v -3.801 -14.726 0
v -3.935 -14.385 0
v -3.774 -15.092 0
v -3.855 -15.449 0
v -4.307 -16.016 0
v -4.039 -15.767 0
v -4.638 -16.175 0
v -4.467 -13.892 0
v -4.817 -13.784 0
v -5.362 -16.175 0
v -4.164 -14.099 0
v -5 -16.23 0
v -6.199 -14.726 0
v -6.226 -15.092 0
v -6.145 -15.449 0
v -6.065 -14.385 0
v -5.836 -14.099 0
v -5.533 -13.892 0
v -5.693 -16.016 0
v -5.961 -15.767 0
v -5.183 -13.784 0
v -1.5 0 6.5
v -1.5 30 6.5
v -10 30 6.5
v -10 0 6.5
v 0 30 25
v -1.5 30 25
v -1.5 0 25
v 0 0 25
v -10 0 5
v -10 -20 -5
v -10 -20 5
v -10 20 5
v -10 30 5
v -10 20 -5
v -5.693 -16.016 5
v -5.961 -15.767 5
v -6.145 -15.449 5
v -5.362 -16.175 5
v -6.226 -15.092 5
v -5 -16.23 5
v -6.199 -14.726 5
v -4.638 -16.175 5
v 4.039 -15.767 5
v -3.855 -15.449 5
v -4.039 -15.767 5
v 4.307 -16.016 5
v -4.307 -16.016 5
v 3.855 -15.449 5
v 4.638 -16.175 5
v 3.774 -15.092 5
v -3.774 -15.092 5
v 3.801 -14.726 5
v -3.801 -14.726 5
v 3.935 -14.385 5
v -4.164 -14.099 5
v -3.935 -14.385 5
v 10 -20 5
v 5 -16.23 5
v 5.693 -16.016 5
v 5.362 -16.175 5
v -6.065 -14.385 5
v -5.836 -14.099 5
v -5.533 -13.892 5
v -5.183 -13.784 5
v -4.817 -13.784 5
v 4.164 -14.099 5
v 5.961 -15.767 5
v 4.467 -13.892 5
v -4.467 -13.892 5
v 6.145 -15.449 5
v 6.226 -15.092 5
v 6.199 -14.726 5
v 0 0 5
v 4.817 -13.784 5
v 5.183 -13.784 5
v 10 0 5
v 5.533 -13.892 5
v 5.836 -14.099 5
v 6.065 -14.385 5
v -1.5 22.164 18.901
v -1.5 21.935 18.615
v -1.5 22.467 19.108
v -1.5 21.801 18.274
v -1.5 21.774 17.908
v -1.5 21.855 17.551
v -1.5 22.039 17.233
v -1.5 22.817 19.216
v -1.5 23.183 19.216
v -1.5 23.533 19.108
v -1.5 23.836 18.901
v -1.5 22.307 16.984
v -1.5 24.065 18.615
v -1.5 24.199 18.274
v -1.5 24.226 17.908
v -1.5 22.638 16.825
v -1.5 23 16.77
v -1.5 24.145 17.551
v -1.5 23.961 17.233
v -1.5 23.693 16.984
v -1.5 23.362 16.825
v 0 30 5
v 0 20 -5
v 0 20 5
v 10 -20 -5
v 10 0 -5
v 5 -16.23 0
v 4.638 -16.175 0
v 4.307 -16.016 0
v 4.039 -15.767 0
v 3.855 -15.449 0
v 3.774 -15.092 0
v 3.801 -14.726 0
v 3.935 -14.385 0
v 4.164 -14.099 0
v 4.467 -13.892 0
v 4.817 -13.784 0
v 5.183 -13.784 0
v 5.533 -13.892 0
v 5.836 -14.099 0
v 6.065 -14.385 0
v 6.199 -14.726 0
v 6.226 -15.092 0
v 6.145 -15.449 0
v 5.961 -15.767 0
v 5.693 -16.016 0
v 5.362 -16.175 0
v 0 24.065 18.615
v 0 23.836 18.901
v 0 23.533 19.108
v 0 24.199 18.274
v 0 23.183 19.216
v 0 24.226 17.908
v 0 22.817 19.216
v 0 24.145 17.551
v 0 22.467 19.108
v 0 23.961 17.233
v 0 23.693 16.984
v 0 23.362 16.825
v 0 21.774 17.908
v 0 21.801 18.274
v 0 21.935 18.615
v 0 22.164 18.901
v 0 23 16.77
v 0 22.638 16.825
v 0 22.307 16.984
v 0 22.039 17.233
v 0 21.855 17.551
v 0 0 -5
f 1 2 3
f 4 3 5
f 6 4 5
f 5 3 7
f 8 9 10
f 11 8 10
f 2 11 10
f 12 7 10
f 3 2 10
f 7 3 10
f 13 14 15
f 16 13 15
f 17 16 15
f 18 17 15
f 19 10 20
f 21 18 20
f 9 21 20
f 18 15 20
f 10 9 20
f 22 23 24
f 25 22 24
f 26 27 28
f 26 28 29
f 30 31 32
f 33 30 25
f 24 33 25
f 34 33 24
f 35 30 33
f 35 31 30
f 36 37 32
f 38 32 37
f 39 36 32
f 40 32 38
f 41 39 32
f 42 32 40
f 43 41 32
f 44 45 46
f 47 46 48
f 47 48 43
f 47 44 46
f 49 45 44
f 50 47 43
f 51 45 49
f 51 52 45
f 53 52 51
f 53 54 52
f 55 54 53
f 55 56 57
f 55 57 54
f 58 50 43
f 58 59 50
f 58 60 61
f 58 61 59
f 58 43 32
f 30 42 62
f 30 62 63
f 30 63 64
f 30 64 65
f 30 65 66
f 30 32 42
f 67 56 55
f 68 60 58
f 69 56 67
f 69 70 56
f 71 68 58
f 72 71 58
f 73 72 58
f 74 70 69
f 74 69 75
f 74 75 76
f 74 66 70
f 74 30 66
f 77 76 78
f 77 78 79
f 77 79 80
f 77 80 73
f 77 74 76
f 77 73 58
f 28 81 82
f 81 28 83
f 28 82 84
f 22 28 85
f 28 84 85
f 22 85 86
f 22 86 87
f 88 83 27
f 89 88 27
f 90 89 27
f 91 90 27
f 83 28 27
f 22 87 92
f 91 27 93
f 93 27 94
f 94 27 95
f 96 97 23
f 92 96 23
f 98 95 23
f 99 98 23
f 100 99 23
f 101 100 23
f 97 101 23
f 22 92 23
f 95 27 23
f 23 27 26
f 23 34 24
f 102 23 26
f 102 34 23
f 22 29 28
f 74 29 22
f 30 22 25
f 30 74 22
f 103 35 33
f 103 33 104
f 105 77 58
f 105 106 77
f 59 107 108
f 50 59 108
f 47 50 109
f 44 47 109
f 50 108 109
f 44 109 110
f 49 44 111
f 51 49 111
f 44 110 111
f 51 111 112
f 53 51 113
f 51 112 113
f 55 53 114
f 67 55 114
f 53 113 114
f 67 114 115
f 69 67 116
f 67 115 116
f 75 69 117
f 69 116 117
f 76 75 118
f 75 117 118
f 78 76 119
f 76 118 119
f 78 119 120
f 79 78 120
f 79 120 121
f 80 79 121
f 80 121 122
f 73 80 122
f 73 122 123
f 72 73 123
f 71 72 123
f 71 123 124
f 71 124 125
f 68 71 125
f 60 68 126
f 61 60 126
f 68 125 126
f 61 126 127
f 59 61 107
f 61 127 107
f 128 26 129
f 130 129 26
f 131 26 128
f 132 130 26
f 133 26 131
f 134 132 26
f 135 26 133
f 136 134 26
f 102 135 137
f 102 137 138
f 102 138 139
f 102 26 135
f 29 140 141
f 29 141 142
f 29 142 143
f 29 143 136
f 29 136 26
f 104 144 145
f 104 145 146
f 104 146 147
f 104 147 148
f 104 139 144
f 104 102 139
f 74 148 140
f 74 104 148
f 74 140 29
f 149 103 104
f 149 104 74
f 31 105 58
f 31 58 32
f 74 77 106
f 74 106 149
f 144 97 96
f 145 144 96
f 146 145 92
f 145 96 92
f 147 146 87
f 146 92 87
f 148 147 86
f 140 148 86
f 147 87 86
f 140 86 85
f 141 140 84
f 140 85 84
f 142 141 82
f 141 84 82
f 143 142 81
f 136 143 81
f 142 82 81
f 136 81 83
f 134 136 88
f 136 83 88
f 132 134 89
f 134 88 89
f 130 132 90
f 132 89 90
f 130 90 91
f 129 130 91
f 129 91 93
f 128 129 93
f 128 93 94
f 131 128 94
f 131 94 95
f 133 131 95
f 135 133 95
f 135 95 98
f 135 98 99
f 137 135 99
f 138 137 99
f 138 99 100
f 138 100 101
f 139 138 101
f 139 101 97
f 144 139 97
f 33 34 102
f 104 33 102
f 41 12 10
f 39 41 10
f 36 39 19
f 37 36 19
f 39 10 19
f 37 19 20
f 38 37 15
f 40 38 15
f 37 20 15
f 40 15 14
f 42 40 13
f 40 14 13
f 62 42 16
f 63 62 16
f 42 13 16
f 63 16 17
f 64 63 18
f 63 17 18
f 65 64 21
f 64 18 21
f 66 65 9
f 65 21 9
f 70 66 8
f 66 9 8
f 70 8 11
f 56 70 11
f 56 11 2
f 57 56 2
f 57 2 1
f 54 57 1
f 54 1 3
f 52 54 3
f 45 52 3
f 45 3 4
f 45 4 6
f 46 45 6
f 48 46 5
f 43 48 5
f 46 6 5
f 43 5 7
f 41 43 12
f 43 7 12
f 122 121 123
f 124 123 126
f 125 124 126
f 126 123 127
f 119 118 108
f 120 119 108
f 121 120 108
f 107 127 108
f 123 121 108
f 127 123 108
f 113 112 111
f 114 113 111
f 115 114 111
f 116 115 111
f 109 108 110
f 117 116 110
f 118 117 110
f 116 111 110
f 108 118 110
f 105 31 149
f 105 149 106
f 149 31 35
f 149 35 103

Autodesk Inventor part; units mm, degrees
ref_plane "YZ Plane" through (0, 0, 0) normal (1, 0, 0) x (0, 1, 0)
ref_plane "XZ Plane" through (0, 0, 0) normal (0, 1, 0) x (-1, 0, 0)
ref_plane "XY Plane" through (0, 0, 0) normal (0, 0, 1) x (1, 0, 0)
sketch "Náčrt1" plane through (0, 0, 0) normal (0, 0, 1) x (1, 0, 0)
  line L0 (-14, 0) -> (14, 0) projected
  line L1 (0, 28) -> (0, -28) projected
  line L2 (-10, 20) -> (10, 20)
  line L3 (10, 20) -> (10, -20)
  line L4 (10, -20) -> (-10, -20)
  line L5 (-10, -20) -> (-10, 20)
  point P0 (0, 0)
  dimension "d0" = 20
  dimension "d1" = 40
extrude "Vysunutí1" add sketch "Náčrt1" along normal mid plane 10
sketch "Náčrt2" plane through (0, 0, 5) normal (0, 0, 1) x (1, 0, 0)
  line L0 (-10, -20) -> (10, -20) projected
  line L1 (10, -20) -> (10, 20) projected
  line L2 (10, 20) -> (-10, 20) projected
  line L3 (-10, 20) -> (-10, -20) projected
  line L4 (10, -20) -> (10, 20) projected
  line L5 (0, 20) -> (10, 20)
  line L6 (10, 20) -> (10, 0)
  line L7 (10, 0) -> (0, 0)
  line L8 (0, 0) -> (0, 20)
  point P0 (0, 0)
extrude "Vysunutí2" cut sketch "Náčrt2" against normal through all contours L7 L8 L2 L1
sketch "Náčrt3" plane through (0, 0, 5) normal (0, 0, 1) x (1, 0, 0)
  line L0 (10, -20) -> (10, 0) projected
  line L1 (-10, -20) -> (10, -20) projected
  point P0 (0, 0)
  point P1 (-5, -15)
  point P2 (5, -15)
  dimension "d6" = 5
  dimension "d7" = 10
  dimension "d8" = 5
  dimension "d9" = 5
hole "Díra1" at (-5, -15, 5) at (5, -15, 5) direction (0, 0, -1) diameter 2.459 depth 5 thread size "M3x0.5" class "6H" standard "ISO Metric profile"
sketch "Náčrt4" plane through (0, 0, 5) normal (0, 0, 1) x (1, 0, 0)
  line L0 (0, 0) -> (-10, 0)
  line L1 (-10, 0) -> (-10, 30)
  line L2 (-10, 30) -> (0, 30)
  line L3 (0, 30) -> (0, 0)
  dimension "d17" = 10
  dimension "d18" = 30
extrude "Vysunutí3" add sketch "Náčrt4" along normal blind 20
sketch "Náčrt5" plane through (-10, 30, 5) normal (0, 1, 0) x (1, 0, 0)
  line L0 (0, -20) -> (10, -20) projected
  line L1 (0, -20) -> (8.5, -20)
  line L2 (8.5, -20) -> (8.5, -1.5)
  line L3 (8.5, -1.5) -> (0, -1.5)
  line L4 (0, -1.5) -> (0, -20)
  point P0 (10, 5)
  dimension "d21" = 8.5
  dimension "d22" = 18.5
extrude "Vysunutí4" cut sketch "Náčrt5" against normal through all
sketch "Náčrt6" plane through (0, 0, -5) normal (1, 0, 0) x (0, 0, -1)
  line L0 (0, 20) -> (0, 0) projected
  line L1 (-10, 20) -> (0, 20) projected
  line L2 (-10, 20) -> (-10, 30) projected
  line L3 (-10, 30) -> (-30, 30) projected
  line L4 (-30, 0) -> (-30, 30) projected
  line L5 (-10, 0) -> (-30, 0) projected
  line L6 (-10, 0) -> (0, 0) projected
  point P0 (-5, 0)
  point P1 (-23, 23)
  dimension "d25" = 7
  dimension "d26" = 7
hole "Díra2" at (0, 23, 18) direction (-1, 0, 0) diameter 2.459 end through all thread size "M3x0.5" class "6H" standard "ISO Metric profile"
properties part number "x_bearing_tab" material "Hliník 6061"
